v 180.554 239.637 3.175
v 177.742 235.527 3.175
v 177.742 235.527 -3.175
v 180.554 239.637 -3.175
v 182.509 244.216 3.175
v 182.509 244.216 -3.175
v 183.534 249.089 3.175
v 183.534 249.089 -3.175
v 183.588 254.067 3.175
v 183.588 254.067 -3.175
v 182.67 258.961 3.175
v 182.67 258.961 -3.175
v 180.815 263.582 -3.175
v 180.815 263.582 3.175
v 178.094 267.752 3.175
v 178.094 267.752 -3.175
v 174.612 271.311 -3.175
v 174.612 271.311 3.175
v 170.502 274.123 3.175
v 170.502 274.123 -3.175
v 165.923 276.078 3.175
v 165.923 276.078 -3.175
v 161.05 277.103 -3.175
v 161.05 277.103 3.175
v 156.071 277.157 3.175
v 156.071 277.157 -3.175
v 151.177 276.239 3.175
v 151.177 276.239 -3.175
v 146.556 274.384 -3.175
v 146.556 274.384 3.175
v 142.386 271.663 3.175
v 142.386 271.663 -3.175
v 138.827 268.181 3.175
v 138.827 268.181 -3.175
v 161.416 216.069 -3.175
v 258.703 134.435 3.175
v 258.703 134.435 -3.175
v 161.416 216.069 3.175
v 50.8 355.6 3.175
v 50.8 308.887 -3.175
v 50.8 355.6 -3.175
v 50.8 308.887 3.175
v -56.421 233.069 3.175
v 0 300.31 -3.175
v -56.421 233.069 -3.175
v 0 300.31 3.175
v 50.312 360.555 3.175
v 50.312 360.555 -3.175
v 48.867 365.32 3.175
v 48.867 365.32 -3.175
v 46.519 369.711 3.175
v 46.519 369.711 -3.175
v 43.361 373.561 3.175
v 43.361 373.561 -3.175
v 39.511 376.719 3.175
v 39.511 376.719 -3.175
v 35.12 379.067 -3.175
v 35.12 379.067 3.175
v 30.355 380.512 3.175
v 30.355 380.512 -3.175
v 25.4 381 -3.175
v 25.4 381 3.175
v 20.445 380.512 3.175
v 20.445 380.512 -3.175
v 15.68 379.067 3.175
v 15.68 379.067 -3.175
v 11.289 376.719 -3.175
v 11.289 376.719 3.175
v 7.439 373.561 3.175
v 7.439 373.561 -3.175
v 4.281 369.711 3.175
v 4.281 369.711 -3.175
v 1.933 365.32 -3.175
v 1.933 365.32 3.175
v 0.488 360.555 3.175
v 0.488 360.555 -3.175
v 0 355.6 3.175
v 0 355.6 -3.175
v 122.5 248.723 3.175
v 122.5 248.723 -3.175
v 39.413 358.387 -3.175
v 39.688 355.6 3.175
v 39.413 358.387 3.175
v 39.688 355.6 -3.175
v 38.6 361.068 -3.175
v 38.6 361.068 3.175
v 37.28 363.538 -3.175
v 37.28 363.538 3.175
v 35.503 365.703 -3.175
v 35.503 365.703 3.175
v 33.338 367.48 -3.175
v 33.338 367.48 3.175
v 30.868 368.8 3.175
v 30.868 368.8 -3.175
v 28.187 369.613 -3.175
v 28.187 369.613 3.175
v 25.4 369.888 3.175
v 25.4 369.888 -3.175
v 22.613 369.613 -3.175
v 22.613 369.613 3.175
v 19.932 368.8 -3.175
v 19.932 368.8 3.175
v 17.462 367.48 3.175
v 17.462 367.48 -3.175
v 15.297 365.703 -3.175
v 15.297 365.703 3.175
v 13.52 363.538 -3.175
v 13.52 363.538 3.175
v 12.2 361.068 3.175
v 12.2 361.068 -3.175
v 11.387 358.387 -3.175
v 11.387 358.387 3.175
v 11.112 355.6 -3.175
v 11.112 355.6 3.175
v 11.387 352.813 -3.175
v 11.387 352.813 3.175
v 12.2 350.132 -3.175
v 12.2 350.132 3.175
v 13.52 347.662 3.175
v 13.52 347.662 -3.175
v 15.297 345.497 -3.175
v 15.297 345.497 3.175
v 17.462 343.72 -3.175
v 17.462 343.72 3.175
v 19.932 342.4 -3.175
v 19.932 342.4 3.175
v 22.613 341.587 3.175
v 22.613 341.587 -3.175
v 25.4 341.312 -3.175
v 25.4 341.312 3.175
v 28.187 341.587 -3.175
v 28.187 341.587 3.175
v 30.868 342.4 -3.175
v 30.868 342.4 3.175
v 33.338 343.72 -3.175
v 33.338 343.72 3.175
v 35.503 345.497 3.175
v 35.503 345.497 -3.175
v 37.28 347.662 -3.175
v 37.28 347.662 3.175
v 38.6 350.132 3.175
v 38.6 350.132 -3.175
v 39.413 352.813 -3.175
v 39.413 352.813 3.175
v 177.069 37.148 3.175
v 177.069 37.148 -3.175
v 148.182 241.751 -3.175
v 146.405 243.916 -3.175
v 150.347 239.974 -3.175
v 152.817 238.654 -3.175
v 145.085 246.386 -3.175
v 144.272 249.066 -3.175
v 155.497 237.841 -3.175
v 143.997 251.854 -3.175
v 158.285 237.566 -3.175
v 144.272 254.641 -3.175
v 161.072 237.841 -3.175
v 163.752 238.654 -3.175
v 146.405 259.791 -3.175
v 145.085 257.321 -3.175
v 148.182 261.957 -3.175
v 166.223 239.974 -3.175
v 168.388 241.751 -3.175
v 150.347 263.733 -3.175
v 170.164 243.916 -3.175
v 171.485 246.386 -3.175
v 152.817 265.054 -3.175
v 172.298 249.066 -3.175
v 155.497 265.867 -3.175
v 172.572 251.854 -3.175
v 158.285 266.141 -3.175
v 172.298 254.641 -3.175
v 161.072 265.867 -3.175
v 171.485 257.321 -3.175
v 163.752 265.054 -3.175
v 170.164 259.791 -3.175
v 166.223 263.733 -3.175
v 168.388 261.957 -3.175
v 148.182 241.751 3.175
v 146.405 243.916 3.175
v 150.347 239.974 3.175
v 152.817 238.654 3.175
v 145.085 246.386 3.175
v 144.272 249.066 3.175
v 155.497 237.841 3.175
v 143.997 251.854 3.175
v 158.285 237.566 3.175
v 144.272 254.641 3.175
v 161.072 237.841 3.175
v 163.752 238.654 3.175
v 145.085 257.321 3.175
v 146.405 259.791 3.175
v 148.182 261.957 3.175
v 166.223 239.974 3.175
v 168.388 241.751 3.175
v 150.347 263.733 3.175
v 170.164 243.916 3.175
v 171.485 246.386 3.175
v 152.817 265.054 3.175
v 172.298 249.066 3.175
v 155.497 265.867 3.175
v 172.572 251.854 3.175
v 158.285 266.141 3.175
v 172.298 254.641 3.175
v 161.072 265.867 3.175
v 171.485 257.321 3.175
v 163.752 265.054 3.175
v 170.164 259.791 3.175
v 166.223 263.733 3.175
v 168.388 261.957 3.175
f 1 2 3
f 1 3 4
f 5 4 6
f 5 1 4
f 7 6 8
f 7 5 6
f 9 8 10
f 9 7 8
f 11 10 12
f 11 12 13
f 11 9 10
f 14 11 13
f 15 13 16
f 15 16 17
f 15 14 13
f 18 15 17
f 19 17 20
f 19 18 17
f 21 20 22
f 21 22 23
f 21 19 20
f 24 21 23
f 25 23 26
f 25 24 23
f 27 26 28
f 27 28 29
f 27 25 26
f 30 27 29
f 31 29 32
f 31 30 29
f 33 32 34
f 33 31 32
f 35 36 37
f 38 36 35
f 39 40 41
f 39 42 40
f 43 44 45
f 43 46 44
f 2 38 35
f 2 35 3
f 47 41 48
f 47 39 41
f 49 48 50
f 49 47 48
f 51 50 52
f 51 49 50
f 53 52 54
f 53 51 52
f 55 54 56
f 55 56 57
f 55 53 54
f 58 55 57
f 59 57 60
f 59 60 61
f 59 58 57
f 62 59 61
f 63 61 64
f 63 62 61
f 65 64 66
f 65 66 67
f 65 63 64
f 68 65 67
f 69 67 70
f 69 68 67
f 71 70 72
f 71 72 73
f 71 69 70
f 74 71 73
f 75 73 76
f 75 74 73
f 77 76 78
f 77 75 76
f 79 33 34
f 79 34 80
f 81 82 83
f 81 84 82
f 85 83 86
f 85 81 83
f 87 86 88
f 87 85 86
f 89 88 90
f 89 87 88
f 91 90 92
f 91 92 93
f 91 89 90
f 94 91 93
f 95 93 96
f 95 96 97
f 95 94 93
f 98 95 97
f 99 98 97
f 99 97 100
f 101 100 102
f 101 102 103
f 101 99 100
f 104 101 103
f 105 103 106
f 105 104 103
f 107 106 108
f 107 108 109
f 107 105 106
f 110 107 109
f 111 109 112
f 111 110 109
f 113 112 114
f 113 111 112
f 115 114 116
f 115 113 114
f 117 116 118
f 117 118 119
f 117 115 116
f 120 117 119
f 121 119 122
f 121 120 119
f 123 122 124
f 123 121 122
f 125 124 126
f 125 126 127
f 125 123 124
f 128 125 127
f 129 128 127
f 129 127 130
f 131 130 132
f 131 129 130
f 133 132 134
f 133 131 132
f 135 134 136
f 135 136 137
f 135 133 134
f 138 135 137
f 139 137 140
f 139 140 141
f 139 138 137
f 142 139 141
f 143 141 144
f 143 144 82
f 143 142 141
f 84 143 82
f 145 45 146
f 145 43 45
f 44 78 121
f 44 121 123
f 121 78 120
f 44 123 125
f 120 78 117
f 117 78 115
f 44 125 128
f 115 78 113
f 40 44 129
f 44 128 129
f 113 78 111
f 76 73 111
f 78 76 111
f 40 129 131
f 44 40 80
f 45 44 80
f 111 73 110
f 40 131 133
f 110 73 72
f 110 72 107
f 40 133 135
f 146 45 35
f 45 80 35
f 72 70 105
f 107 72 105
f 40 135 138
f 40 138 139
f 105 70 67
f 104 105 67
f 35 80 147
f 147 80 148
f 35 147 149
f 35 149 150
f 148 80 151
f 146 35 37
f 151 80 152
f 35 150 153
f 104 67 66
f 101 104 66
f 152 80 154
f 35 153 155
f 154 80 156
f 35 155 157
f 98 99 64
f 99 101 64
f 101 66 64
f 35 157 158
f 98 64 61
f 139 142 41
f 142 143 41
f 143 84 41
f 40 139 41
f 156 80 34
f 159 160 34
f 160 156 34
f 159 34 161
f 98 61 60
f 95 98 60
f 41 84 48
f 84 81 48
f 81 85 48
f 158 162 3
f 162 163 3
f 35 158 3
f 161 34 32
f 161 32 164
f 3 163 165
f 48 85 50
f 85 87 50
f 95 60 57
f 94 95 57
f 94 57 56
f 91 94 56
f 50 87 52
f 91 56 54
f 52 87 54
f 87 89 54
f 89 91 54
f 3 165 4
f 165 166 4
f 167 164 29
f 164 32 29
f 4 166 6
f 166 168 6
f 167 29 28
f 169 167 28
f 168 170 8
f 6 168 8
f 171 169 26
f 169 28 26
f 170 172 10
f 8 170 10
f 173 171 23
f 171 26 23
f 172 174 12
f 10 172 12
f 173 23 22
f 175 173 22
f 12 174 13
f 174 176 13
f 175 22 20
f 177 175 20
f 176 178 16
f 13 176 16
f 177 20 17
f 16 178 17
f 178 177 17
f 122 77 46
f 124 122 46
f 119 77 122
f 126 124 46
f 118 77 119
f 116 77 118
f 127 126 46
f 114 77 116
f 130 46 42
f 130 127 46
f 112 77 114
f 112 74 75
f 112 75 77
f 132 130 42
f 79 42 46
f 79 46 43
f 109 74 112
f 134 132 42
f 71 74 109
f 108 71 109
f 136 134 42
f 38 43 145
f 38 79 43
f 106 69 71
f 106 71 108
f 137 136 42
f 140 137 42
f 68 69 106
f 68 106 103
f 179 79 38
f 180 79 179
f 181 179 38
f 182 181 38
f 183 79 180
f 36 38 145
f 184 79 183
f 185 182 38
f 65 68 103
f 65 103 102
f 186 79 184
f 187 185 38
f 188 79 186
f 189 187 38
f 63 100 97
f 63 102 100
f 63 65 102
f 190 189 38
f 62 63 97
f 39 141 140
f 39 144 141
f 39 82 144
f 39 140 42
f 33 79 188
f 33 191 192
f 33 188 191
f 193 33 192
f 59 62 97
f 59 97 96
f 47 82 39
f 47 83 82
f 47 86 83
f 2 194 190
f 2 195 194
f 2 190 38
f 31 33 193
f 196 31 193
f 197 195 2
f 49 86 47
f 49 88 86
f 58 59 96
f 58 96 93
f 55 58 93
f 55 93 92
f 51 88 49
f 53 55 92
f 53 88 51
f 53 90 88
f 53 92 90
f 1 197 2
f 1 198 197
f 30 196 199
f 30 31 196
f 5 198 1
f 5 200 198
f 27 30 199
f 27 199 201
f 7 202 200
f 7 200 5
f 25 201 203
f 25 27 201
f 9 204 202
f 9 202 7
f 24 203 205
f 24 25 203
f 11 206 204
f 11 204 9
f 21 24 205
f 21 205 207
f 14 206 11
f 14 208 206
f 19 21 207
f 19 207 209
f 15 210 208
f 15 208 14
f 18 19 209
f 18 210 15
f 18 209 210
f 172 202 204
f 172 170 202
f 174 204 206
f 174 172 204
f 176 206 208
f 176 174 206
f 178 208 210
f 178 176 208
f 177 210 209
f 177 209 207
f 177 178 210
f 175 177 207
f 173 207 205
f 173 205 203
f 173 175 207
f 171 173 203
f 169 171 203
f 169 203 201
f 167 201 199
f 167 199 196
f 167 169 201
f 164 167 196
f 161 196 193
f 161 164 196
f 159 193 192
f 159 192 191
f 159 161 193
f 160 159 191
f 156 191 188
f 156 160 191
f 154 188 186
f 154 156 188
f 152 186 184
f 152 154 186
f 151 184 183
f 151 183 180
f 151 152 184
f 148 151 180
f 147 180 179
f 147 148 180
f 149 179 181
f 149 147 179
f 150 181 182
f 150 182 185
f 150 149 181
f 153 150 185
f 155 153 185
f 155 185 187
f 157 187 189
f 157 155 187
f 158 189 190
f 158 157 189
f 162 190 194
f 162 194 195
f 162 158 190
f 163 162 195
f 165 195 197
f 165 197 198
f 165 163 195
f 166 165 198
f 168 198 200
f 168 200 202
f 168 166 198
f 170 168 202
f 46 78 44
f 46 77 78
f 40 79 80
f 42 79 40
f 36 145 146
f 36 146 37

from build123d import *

# Parameters (mm, degrees)
SKETCH1_R           = 14.2875
BOSS_EXTRUDE1_DEPTH = 3.175


with BuildPart() as part:
    # Sketch1 → Boss-Extrude1 (new body, symmetric)
    with BuildSketch(Plane.XY):
        with BuildLine():
            Line((-56.421183023, 233.069398752), (177.06916324, 37.147735319))
            Line((177.06916324, 37.147735319), (258.70318967, 134.435379595))
            Line((258.70318967, 134.435379595), (161.415545394, 216.069406025))
            Line((161.415545394, 216.069406025), (177.74235068, 235.526934881))
            ThreePointArc((177.74235068, 235.526934881), (174.611627111, 271.311269022), (138.82729297, 268.180545453))
            Line((138.82729297, 268.180545453), (122.500487684, 248.723016597))
            Line((122.500487684, 248.723016597), (50.8, 308.886869368))
            Line((50.8, 308.886869368), (50.8, 355.6))
            ThreePointArc((50.8, 355.6), (25.4, 381), (0, 355.6))
            Line((0, 355.6), (0, 300.309546317))
            Line((0, 300.309546317), (-56.421183023, 233.069398752))
        make_face()
        with Locations((25.4, 355.6)):
            Circle(SKETCH1_R, mode=Mode.SUBTRACT)
        with Locations((158.284821825, 251.853740167)):
            Circle(SKETCH1_R, mode=Mode.SUBTRACT)
    extrude(amount=BOSS_EXTRUDE1_DEPTH, both=True)


solid = part.part
